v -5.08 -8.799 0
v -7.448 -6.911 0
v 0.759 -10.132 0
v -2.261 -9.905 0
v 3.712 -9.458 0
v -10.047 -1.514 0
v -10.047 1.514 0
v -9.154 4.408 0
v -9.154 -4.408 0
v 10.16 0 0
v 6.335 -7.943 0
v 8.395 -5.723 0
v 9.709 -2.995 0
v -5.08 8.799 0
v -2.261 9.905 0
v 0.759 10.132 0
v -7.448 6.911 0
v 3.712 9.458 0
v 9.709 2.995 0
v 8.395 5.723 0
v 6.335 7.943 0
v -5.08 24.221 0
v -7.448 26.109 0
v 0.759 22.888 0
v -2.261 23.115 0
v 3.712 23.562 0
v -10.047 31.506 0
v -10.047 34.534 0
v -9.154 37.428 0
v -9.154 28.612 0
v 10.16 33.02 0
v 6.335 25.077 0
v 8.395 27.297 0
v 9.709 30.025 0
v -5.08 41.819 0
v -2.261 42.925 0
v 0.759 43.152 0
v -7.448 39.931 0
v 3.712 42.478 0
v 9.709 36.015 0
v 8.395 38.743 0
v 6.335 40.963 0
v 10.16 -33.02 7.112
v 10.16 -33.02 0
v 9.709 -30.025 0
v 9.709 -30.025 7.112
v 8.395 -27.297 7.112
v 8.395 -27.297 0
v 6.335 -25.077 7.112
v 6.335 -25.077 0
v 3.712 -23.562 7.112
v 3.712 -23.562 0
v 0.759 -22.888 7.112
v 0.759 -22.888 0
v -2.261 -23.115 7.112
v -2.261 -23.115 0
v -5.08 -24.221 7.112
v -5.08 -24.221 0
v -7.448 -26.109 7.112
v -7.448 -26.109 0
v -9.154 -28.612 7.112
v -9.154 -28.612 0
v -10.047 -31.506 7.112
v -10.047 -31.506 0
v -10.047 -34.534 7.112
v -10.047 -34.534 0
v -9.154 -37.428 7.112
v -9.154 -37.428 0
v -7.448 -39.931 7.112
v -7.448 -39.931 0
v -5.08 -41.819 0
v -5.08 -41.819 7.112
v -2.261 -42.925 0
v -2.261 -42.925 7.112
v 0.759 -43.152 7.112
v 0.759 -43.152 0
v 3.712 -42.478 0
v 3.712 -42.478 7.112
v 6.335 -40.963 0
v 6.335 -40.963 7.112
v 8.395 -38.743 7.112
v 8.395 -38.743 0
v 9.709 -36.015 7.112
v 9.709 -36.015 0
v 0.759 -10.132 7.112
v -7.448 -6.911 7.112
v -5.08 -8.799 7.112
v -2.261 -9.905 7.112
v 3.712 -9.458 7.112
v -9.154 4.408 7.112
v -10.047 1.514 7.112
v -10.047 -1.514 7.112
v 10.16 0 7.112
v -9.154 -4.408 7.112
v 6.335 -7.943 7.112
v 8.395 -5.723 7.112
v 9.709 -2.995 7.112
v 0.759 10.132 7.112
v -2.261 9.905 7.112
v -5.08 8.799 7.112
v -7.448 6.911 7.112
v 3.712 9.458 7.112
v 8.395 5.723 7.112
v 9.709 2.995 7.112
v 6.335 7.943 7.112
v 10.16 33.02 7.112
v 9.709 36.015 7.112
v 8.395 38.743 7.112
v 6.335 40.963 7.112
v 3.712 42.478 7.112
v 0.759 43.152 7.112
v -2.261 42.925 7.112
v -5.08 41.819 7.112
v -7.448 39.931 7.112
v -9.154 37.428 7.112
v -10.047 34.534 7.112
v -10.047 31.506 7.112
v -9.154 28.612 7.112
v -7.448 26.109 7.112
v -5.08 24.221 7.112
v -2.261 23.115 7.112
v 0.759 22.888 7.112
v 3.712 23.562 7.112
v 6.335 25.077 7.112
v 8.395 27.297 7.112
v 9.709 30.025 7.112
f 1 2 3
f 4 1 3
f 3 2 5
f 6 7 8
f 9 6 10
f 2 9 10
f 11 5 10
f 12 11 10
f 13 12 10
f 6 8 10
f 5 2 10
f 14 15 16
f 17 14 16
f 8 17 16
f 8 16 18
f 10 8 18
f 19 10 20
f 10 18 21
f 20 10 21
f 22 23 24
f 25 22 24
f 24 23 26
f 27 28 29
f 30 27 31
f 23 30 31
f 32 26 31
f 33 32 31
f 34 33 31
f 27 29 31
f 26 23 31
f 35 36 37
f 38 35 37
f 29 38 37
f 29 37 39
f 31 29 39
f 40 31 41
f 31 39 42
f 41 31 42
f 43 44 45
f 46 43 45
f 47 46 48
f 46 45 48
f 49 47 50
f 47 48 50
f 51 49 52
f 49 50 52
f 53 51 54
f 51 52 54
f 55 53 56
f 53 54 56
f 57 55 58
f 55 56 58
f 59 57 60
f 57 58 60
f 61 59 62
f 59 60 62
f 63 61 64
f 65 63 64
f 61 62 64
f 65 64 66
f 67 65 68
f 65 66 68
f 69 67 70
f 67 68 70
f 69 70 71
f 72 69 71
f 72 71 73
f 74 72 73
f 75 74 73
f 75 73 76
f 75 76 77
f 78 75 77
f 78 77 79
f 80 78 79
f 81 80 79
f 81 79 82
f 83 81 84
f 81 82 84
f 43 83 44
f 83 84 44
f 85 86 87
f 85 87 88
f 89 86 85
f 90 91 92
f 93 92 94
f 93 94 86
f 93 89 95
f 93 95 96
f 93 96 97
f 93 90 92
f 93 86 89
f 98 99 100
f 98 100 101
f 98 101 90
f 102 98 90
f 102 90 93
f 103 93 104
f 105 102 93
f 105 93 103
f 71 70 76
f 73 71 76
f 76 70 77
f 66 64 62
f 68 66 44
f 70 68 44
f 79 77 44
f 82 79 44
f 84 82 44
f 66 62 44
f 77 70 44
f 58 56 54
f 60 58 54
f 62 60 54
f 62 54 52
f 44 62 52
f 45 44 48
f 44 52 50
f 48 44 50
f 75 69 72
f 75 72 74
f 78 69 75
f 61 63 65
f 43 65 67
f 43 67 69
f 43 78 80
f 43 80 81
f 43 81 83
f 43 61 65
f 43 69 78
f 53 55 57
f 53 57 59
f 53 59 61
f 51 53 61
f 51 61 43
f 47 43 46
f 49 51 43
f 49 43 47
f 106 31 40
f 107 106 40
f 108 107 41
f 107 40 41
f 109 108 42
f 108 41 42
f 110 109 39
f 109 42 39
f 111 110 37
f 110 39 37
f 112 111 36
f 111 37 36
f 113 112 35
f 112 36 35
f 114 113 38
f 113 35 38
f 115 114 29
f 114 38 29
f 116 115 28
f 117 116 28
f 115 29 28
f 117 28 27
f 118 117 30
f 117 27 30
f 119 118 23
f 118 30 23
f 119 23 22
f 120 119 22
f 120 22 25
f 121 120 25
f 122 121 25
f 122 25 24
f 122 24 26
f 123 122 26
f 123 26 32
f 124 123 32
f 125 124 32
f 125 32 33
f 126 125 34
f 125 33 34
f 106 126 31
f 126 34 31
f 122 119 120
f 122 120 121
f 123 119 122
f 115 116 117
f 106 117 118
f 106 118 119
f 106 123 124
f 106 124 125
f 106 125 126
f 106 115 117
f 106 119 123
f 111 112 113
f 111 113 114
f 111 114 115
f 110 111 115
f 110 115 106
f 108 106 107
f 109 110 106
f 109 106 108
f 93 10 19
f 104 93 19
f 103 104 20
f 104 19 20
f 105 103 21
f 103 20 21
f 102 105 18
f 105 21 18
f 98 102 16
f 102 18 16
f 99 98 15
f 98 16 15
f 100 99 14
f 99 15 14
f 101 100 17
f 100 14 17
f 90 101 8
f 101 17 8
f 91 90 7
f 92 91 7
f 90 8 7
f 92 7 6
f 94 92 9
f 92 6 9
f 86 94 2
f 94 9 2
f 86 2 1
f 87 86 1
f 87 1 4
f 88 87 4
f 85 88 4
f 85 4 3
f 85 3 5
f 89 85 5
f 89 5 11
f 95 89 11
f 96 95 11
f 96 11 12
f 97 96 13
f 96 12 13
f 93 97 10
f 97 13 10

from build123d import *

# Parameters (mm, degrees)
F0_R     = 10.16
F1_R     = 10.16
F2_DEPTH = 7.112


with BuildPart() as f2:
    # F0 (on Top) + F1 (on Top) → F2 (new body)
    with BuildSketch(Plane.XY):
        with Locations((0, 33.02)):
            Circle(F0_R)
        with Locations((0, -33.02)):
            Circle(F0_R)
    with BuildSketch(Plane.XY):
        Circle(F1_R)
    extrude(amount=F2_DEPTH)


solid = f2.part
